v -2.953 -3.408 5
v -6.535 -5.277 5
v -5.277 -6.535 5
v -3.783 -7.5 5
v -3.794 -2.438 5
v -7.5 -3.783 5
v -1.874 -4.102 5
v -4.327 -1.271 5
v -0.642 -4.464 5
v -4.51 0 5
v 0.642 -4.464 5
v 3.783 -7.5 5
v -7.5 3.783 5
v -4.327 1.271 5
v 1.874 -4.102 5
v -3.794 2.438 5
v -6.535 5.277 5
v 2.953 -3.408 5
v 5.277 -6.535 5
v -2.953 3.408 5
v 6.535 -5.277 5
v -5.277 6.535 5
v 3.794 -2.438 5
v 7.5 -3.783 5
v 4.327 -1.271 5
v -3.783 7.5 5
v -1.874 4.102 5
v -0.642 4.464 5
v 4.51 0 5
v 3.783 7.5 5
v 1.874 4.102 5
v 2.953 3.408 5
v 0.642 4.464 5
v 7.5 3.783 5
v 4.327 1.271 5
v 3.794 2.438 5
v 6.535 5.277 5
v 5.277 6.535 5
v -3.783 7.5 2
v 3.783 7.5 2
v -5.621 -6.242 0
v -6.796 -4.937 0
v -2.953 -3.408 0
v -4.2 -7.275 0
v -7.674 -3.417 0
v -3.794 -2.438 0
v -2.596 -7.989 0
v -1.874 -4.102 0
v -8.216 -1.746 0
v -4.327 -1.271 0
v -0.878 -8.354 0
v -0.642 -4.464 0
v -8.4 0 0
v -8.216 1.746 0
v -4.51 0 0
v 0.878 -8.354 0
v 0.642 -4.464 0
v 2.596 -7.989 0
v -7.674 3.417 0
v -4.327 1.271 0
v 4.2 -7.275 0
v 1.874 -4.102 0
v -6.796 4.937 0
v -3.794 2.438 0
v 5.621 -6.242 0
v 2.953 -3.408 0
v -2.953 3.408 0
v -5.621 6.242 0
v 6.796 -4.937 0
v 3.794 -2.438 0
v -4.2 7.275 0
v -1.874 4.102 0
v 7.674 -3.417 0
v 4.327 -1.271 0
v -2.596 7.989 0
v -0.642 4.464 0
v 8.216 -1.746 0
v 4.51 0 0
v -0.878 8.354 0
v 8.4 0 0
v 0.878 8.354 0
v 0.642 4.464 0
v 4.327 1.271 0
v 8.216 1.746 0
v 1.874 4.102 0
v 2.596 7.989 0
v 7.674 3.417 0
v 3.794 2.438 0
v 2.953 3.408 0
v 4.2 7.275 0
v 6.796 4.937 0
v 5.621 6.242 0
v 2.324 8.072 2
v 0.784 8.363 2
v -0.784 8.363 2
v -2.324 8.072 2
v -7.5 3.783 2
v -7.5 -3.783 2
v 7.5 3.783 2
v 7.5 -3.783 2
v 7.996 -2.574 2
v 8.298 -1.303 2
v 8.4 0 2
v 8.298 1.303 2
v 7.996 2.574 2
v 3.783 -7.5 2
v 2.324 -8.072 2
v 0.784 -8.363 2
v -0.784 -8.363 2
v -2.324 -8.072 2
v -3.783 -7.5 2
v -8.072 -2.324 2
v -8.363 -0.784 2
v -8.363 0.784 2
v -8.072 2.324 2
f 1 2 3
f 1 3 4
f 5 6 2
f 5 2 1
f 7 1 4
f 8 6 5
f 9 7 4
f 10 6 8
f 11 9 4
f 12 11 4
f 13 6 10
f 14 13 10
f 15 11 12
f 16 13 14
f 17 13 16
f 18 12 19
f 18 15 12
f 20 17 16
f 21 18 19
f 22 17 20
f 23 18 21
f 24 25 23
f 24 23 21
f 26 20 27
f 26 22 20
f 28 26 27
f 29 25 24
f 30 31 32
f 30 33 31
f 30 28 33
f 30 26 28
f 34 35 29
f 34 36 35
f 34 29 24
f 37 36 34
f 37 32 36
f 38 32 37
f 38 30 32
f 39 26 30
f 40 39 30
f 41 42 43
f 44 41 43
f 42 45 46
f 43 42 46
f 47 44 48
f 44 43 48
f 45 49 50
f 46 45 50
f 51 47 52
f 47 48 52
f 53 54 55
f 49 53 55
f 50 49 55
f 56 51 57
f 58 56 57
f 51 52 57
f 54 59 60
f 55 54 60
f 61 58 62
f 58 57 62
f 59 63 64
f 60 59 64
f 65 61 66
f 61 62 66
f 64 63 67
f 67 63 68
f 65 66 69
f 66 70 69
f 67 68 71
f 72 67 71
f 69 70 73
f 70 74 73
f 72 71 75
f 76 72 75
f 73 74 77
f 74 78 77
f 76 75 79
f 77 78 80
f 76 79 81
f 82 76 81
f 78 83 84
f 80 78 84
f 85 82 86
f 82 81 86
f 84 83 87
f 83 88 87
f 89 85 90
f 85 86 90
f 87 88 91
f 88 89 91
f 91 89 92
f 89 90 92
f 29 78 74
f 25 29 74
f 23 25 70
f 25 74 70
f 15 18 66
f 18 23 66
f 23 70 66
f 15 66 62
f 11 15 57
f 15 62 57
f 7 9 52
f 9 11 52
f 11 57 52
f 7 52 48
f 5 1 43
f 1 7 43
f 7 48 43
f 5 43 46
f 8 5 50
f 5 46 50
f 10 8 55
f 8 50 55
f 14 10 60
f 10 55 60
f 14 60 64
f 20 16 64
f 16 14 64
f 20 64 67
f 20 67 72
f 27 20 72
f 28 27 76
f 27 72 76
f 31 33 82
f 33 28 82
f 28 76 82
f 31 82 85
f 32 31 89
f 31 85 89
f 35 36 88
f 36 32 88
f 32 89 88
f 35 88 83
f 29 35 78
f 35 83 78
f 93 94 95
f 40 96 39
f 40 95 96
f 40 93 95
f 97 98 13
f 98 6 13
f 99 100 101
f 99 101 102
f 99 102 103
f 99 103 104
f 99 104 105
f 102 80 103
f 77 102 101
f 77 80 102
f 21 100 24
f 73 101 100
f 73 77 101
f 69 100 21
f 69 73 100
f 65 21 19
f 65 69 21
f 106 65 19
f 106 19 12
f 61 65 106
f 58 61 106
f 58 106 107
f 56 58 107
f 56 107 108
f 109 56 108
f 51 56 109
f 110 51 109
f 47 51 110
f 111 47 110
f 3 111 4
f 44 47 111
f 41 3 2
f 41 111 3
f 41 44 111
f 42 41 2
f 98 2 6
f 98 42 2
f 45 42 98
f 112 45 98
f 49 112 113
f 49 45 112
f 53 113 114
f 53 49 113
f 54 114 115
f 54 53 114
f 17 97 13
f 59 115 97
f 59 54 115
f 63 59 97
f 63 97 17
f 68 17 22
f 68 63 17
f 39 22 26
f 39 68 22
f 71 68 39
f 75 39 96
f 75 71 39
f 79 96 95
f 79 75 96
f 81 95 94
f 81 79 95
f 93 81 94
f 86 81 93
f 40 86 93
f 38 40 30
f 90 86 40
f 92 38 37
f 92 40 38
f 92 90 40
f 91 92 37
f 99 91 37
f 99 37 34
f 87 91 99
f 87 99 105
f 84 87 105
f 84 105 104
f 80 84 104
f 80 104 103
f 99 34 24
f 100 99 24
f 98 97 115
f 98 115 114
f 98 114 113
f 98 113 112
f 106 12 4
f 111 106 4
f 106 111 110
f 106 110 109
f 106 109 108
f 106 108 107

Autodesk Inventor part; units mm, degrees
ref_plane "YZ Plane" through (0, 0, 0) normal (1, 0, 0) x (0, 1, 0)
ref_plane "XZ Plane" through (0, 0, 0) normal (0, 1, 0) x (-1, 0, 0)
ref_plane "XY Plane" through (0, 0, 0) normal (0, 0, 1) x (1, 0, 0)
sketch "Sketch1" plane through (0, 0, 0) normal (0, 0, 1) x (1, 0, 0)
  circle A0 centre (0, 0) radius 4.51
  circle A1 centre (0, 0) radius 8.4
  dimension "d0" = 9.02
  dimension "d1" = 16.8
extrude "Extrusion1" add sketch "Sketch1" along normal blind 5
sketch "Sketch2" plane through (0, 0, 5) normal (0, 0, 1) x (1, 0, 0)
  line L0 (-7.5, 7.5) -> (7.5, 7.5)
  line L1 (7.5, 7.5) -> (7.5, -7.5)
  line L2 (7.5, -7.5) -> (-7.5, -7.5)
  line L3 (-7.5, -7.5) -> (-7.5, 7.5)
  line L4 (0, 0) -> (0, 8.3867)
  line L5 (0, 0) -> (9.7878, 0)
  circle A0 centre (0, 0) radius 10.6066
  point P0 (0, 7.5)
  point P1 (7.5, 0)
  dimension "d4" = 15
extrude "Extrusion2" cut sketch "Sketch2" against normal blind 3 contours A0 L0 | L3 A0 | L2 A0 | A0 L1
properties part number "TuercaD_eje" material "Steel"
